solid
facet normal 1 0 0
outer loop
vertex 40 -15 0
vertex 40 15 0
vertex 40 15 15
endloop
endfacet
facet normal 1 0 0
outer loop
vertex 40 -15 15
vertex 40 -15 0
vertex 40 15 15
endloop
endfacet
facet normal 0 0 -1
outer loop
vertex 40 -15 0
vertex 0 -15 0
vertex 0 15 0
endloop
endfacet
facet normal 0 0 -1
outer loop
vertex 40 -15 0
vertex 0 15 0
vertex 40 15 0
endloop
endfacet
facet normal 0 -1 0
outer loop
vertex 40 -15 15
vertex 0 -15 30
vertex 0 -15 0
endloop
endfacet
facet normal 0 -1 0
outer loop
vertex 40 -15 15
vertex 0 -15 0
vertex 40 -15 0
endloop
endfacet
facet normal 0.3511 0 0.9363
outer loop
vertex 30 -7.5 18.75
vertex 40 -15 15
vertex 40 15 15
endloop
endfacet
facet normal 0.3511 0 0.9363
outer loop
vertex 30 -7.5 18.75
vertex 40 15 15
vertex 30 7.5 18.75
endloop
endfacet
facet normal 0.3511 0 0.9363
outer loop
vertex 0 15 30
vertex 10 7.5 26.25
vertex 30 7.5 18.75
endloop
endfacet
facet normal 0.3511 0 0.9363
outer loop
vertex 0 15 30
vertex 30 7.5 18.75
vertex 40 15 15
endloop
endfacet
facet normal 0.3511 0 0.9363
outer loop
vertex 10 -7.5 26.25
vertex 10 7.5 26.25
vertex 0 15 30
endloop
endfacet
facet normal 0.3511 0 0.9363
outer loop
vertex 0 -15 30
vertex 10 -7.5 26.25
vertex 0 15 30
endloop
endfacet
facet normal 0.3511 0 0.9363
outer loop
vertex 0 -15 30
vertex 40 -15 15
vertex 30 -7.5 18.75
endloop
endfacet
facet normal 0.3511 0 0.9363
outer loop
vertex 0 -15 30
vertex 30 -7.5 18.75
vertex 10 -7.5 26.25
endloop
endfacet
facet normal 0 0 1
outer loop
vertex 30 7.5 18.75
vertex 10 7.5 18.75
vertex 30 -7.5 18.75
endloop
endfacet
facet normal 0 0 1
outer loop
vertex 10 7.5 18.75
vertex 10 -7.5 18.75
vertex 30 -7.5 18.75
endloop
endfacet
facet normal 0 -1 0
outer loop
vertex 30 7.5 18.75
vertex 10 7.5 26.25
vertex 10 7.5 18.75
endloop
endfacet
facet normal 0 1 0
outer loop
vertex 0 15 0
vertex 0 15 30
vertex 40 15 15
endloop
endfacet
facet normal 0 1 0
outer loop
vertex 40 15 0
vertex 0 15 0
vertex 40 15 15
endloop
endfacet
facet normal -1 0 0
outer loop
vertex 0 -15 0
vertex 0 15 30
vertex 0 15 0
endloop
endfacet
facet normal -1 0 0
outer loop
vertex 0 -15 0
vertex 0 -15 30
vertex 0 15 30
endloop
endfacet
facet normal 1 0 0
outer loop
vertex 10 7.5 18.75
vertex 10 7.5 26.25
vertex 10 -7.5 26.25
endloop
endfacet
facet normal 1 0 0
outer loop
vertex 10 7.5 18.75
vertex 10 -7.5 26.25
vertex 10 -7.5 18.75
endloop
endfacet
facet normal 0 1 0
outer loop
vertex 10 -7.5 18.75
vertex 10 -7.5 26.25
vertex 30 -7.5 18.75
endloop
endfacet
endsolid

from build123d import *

# Parameters (mm, degrees)
F1_DEPTH = 15
F2_DEPTH = 7.5


with BuildPart() as f1:
    # F0 (on Front) → F1 (new body, symmetric)
    with BuildSketch(Plane.XZ):
        Polygon((0, 30), (0, 0), (40, 0), (40, 15), (30, 18.75), (10, 18.75), (10, 26.25), align=None)
        Polygon((30, 18.75), (10, 26.25), (10, 18.75), align=None)
    extrude(amount=F1_DEPTH, both=True)

    # F0 (on Front) → F2 (cut, symmetric)
    with BuildSketch(Plane.XZ):
        Polygon((30, 18.75), (10, 26.25), (10, 18.75), align=None)
    extrude(amount=F2_DEPTH, both=True, mode=Mode.SUBTRACT)


solid = f1.part
